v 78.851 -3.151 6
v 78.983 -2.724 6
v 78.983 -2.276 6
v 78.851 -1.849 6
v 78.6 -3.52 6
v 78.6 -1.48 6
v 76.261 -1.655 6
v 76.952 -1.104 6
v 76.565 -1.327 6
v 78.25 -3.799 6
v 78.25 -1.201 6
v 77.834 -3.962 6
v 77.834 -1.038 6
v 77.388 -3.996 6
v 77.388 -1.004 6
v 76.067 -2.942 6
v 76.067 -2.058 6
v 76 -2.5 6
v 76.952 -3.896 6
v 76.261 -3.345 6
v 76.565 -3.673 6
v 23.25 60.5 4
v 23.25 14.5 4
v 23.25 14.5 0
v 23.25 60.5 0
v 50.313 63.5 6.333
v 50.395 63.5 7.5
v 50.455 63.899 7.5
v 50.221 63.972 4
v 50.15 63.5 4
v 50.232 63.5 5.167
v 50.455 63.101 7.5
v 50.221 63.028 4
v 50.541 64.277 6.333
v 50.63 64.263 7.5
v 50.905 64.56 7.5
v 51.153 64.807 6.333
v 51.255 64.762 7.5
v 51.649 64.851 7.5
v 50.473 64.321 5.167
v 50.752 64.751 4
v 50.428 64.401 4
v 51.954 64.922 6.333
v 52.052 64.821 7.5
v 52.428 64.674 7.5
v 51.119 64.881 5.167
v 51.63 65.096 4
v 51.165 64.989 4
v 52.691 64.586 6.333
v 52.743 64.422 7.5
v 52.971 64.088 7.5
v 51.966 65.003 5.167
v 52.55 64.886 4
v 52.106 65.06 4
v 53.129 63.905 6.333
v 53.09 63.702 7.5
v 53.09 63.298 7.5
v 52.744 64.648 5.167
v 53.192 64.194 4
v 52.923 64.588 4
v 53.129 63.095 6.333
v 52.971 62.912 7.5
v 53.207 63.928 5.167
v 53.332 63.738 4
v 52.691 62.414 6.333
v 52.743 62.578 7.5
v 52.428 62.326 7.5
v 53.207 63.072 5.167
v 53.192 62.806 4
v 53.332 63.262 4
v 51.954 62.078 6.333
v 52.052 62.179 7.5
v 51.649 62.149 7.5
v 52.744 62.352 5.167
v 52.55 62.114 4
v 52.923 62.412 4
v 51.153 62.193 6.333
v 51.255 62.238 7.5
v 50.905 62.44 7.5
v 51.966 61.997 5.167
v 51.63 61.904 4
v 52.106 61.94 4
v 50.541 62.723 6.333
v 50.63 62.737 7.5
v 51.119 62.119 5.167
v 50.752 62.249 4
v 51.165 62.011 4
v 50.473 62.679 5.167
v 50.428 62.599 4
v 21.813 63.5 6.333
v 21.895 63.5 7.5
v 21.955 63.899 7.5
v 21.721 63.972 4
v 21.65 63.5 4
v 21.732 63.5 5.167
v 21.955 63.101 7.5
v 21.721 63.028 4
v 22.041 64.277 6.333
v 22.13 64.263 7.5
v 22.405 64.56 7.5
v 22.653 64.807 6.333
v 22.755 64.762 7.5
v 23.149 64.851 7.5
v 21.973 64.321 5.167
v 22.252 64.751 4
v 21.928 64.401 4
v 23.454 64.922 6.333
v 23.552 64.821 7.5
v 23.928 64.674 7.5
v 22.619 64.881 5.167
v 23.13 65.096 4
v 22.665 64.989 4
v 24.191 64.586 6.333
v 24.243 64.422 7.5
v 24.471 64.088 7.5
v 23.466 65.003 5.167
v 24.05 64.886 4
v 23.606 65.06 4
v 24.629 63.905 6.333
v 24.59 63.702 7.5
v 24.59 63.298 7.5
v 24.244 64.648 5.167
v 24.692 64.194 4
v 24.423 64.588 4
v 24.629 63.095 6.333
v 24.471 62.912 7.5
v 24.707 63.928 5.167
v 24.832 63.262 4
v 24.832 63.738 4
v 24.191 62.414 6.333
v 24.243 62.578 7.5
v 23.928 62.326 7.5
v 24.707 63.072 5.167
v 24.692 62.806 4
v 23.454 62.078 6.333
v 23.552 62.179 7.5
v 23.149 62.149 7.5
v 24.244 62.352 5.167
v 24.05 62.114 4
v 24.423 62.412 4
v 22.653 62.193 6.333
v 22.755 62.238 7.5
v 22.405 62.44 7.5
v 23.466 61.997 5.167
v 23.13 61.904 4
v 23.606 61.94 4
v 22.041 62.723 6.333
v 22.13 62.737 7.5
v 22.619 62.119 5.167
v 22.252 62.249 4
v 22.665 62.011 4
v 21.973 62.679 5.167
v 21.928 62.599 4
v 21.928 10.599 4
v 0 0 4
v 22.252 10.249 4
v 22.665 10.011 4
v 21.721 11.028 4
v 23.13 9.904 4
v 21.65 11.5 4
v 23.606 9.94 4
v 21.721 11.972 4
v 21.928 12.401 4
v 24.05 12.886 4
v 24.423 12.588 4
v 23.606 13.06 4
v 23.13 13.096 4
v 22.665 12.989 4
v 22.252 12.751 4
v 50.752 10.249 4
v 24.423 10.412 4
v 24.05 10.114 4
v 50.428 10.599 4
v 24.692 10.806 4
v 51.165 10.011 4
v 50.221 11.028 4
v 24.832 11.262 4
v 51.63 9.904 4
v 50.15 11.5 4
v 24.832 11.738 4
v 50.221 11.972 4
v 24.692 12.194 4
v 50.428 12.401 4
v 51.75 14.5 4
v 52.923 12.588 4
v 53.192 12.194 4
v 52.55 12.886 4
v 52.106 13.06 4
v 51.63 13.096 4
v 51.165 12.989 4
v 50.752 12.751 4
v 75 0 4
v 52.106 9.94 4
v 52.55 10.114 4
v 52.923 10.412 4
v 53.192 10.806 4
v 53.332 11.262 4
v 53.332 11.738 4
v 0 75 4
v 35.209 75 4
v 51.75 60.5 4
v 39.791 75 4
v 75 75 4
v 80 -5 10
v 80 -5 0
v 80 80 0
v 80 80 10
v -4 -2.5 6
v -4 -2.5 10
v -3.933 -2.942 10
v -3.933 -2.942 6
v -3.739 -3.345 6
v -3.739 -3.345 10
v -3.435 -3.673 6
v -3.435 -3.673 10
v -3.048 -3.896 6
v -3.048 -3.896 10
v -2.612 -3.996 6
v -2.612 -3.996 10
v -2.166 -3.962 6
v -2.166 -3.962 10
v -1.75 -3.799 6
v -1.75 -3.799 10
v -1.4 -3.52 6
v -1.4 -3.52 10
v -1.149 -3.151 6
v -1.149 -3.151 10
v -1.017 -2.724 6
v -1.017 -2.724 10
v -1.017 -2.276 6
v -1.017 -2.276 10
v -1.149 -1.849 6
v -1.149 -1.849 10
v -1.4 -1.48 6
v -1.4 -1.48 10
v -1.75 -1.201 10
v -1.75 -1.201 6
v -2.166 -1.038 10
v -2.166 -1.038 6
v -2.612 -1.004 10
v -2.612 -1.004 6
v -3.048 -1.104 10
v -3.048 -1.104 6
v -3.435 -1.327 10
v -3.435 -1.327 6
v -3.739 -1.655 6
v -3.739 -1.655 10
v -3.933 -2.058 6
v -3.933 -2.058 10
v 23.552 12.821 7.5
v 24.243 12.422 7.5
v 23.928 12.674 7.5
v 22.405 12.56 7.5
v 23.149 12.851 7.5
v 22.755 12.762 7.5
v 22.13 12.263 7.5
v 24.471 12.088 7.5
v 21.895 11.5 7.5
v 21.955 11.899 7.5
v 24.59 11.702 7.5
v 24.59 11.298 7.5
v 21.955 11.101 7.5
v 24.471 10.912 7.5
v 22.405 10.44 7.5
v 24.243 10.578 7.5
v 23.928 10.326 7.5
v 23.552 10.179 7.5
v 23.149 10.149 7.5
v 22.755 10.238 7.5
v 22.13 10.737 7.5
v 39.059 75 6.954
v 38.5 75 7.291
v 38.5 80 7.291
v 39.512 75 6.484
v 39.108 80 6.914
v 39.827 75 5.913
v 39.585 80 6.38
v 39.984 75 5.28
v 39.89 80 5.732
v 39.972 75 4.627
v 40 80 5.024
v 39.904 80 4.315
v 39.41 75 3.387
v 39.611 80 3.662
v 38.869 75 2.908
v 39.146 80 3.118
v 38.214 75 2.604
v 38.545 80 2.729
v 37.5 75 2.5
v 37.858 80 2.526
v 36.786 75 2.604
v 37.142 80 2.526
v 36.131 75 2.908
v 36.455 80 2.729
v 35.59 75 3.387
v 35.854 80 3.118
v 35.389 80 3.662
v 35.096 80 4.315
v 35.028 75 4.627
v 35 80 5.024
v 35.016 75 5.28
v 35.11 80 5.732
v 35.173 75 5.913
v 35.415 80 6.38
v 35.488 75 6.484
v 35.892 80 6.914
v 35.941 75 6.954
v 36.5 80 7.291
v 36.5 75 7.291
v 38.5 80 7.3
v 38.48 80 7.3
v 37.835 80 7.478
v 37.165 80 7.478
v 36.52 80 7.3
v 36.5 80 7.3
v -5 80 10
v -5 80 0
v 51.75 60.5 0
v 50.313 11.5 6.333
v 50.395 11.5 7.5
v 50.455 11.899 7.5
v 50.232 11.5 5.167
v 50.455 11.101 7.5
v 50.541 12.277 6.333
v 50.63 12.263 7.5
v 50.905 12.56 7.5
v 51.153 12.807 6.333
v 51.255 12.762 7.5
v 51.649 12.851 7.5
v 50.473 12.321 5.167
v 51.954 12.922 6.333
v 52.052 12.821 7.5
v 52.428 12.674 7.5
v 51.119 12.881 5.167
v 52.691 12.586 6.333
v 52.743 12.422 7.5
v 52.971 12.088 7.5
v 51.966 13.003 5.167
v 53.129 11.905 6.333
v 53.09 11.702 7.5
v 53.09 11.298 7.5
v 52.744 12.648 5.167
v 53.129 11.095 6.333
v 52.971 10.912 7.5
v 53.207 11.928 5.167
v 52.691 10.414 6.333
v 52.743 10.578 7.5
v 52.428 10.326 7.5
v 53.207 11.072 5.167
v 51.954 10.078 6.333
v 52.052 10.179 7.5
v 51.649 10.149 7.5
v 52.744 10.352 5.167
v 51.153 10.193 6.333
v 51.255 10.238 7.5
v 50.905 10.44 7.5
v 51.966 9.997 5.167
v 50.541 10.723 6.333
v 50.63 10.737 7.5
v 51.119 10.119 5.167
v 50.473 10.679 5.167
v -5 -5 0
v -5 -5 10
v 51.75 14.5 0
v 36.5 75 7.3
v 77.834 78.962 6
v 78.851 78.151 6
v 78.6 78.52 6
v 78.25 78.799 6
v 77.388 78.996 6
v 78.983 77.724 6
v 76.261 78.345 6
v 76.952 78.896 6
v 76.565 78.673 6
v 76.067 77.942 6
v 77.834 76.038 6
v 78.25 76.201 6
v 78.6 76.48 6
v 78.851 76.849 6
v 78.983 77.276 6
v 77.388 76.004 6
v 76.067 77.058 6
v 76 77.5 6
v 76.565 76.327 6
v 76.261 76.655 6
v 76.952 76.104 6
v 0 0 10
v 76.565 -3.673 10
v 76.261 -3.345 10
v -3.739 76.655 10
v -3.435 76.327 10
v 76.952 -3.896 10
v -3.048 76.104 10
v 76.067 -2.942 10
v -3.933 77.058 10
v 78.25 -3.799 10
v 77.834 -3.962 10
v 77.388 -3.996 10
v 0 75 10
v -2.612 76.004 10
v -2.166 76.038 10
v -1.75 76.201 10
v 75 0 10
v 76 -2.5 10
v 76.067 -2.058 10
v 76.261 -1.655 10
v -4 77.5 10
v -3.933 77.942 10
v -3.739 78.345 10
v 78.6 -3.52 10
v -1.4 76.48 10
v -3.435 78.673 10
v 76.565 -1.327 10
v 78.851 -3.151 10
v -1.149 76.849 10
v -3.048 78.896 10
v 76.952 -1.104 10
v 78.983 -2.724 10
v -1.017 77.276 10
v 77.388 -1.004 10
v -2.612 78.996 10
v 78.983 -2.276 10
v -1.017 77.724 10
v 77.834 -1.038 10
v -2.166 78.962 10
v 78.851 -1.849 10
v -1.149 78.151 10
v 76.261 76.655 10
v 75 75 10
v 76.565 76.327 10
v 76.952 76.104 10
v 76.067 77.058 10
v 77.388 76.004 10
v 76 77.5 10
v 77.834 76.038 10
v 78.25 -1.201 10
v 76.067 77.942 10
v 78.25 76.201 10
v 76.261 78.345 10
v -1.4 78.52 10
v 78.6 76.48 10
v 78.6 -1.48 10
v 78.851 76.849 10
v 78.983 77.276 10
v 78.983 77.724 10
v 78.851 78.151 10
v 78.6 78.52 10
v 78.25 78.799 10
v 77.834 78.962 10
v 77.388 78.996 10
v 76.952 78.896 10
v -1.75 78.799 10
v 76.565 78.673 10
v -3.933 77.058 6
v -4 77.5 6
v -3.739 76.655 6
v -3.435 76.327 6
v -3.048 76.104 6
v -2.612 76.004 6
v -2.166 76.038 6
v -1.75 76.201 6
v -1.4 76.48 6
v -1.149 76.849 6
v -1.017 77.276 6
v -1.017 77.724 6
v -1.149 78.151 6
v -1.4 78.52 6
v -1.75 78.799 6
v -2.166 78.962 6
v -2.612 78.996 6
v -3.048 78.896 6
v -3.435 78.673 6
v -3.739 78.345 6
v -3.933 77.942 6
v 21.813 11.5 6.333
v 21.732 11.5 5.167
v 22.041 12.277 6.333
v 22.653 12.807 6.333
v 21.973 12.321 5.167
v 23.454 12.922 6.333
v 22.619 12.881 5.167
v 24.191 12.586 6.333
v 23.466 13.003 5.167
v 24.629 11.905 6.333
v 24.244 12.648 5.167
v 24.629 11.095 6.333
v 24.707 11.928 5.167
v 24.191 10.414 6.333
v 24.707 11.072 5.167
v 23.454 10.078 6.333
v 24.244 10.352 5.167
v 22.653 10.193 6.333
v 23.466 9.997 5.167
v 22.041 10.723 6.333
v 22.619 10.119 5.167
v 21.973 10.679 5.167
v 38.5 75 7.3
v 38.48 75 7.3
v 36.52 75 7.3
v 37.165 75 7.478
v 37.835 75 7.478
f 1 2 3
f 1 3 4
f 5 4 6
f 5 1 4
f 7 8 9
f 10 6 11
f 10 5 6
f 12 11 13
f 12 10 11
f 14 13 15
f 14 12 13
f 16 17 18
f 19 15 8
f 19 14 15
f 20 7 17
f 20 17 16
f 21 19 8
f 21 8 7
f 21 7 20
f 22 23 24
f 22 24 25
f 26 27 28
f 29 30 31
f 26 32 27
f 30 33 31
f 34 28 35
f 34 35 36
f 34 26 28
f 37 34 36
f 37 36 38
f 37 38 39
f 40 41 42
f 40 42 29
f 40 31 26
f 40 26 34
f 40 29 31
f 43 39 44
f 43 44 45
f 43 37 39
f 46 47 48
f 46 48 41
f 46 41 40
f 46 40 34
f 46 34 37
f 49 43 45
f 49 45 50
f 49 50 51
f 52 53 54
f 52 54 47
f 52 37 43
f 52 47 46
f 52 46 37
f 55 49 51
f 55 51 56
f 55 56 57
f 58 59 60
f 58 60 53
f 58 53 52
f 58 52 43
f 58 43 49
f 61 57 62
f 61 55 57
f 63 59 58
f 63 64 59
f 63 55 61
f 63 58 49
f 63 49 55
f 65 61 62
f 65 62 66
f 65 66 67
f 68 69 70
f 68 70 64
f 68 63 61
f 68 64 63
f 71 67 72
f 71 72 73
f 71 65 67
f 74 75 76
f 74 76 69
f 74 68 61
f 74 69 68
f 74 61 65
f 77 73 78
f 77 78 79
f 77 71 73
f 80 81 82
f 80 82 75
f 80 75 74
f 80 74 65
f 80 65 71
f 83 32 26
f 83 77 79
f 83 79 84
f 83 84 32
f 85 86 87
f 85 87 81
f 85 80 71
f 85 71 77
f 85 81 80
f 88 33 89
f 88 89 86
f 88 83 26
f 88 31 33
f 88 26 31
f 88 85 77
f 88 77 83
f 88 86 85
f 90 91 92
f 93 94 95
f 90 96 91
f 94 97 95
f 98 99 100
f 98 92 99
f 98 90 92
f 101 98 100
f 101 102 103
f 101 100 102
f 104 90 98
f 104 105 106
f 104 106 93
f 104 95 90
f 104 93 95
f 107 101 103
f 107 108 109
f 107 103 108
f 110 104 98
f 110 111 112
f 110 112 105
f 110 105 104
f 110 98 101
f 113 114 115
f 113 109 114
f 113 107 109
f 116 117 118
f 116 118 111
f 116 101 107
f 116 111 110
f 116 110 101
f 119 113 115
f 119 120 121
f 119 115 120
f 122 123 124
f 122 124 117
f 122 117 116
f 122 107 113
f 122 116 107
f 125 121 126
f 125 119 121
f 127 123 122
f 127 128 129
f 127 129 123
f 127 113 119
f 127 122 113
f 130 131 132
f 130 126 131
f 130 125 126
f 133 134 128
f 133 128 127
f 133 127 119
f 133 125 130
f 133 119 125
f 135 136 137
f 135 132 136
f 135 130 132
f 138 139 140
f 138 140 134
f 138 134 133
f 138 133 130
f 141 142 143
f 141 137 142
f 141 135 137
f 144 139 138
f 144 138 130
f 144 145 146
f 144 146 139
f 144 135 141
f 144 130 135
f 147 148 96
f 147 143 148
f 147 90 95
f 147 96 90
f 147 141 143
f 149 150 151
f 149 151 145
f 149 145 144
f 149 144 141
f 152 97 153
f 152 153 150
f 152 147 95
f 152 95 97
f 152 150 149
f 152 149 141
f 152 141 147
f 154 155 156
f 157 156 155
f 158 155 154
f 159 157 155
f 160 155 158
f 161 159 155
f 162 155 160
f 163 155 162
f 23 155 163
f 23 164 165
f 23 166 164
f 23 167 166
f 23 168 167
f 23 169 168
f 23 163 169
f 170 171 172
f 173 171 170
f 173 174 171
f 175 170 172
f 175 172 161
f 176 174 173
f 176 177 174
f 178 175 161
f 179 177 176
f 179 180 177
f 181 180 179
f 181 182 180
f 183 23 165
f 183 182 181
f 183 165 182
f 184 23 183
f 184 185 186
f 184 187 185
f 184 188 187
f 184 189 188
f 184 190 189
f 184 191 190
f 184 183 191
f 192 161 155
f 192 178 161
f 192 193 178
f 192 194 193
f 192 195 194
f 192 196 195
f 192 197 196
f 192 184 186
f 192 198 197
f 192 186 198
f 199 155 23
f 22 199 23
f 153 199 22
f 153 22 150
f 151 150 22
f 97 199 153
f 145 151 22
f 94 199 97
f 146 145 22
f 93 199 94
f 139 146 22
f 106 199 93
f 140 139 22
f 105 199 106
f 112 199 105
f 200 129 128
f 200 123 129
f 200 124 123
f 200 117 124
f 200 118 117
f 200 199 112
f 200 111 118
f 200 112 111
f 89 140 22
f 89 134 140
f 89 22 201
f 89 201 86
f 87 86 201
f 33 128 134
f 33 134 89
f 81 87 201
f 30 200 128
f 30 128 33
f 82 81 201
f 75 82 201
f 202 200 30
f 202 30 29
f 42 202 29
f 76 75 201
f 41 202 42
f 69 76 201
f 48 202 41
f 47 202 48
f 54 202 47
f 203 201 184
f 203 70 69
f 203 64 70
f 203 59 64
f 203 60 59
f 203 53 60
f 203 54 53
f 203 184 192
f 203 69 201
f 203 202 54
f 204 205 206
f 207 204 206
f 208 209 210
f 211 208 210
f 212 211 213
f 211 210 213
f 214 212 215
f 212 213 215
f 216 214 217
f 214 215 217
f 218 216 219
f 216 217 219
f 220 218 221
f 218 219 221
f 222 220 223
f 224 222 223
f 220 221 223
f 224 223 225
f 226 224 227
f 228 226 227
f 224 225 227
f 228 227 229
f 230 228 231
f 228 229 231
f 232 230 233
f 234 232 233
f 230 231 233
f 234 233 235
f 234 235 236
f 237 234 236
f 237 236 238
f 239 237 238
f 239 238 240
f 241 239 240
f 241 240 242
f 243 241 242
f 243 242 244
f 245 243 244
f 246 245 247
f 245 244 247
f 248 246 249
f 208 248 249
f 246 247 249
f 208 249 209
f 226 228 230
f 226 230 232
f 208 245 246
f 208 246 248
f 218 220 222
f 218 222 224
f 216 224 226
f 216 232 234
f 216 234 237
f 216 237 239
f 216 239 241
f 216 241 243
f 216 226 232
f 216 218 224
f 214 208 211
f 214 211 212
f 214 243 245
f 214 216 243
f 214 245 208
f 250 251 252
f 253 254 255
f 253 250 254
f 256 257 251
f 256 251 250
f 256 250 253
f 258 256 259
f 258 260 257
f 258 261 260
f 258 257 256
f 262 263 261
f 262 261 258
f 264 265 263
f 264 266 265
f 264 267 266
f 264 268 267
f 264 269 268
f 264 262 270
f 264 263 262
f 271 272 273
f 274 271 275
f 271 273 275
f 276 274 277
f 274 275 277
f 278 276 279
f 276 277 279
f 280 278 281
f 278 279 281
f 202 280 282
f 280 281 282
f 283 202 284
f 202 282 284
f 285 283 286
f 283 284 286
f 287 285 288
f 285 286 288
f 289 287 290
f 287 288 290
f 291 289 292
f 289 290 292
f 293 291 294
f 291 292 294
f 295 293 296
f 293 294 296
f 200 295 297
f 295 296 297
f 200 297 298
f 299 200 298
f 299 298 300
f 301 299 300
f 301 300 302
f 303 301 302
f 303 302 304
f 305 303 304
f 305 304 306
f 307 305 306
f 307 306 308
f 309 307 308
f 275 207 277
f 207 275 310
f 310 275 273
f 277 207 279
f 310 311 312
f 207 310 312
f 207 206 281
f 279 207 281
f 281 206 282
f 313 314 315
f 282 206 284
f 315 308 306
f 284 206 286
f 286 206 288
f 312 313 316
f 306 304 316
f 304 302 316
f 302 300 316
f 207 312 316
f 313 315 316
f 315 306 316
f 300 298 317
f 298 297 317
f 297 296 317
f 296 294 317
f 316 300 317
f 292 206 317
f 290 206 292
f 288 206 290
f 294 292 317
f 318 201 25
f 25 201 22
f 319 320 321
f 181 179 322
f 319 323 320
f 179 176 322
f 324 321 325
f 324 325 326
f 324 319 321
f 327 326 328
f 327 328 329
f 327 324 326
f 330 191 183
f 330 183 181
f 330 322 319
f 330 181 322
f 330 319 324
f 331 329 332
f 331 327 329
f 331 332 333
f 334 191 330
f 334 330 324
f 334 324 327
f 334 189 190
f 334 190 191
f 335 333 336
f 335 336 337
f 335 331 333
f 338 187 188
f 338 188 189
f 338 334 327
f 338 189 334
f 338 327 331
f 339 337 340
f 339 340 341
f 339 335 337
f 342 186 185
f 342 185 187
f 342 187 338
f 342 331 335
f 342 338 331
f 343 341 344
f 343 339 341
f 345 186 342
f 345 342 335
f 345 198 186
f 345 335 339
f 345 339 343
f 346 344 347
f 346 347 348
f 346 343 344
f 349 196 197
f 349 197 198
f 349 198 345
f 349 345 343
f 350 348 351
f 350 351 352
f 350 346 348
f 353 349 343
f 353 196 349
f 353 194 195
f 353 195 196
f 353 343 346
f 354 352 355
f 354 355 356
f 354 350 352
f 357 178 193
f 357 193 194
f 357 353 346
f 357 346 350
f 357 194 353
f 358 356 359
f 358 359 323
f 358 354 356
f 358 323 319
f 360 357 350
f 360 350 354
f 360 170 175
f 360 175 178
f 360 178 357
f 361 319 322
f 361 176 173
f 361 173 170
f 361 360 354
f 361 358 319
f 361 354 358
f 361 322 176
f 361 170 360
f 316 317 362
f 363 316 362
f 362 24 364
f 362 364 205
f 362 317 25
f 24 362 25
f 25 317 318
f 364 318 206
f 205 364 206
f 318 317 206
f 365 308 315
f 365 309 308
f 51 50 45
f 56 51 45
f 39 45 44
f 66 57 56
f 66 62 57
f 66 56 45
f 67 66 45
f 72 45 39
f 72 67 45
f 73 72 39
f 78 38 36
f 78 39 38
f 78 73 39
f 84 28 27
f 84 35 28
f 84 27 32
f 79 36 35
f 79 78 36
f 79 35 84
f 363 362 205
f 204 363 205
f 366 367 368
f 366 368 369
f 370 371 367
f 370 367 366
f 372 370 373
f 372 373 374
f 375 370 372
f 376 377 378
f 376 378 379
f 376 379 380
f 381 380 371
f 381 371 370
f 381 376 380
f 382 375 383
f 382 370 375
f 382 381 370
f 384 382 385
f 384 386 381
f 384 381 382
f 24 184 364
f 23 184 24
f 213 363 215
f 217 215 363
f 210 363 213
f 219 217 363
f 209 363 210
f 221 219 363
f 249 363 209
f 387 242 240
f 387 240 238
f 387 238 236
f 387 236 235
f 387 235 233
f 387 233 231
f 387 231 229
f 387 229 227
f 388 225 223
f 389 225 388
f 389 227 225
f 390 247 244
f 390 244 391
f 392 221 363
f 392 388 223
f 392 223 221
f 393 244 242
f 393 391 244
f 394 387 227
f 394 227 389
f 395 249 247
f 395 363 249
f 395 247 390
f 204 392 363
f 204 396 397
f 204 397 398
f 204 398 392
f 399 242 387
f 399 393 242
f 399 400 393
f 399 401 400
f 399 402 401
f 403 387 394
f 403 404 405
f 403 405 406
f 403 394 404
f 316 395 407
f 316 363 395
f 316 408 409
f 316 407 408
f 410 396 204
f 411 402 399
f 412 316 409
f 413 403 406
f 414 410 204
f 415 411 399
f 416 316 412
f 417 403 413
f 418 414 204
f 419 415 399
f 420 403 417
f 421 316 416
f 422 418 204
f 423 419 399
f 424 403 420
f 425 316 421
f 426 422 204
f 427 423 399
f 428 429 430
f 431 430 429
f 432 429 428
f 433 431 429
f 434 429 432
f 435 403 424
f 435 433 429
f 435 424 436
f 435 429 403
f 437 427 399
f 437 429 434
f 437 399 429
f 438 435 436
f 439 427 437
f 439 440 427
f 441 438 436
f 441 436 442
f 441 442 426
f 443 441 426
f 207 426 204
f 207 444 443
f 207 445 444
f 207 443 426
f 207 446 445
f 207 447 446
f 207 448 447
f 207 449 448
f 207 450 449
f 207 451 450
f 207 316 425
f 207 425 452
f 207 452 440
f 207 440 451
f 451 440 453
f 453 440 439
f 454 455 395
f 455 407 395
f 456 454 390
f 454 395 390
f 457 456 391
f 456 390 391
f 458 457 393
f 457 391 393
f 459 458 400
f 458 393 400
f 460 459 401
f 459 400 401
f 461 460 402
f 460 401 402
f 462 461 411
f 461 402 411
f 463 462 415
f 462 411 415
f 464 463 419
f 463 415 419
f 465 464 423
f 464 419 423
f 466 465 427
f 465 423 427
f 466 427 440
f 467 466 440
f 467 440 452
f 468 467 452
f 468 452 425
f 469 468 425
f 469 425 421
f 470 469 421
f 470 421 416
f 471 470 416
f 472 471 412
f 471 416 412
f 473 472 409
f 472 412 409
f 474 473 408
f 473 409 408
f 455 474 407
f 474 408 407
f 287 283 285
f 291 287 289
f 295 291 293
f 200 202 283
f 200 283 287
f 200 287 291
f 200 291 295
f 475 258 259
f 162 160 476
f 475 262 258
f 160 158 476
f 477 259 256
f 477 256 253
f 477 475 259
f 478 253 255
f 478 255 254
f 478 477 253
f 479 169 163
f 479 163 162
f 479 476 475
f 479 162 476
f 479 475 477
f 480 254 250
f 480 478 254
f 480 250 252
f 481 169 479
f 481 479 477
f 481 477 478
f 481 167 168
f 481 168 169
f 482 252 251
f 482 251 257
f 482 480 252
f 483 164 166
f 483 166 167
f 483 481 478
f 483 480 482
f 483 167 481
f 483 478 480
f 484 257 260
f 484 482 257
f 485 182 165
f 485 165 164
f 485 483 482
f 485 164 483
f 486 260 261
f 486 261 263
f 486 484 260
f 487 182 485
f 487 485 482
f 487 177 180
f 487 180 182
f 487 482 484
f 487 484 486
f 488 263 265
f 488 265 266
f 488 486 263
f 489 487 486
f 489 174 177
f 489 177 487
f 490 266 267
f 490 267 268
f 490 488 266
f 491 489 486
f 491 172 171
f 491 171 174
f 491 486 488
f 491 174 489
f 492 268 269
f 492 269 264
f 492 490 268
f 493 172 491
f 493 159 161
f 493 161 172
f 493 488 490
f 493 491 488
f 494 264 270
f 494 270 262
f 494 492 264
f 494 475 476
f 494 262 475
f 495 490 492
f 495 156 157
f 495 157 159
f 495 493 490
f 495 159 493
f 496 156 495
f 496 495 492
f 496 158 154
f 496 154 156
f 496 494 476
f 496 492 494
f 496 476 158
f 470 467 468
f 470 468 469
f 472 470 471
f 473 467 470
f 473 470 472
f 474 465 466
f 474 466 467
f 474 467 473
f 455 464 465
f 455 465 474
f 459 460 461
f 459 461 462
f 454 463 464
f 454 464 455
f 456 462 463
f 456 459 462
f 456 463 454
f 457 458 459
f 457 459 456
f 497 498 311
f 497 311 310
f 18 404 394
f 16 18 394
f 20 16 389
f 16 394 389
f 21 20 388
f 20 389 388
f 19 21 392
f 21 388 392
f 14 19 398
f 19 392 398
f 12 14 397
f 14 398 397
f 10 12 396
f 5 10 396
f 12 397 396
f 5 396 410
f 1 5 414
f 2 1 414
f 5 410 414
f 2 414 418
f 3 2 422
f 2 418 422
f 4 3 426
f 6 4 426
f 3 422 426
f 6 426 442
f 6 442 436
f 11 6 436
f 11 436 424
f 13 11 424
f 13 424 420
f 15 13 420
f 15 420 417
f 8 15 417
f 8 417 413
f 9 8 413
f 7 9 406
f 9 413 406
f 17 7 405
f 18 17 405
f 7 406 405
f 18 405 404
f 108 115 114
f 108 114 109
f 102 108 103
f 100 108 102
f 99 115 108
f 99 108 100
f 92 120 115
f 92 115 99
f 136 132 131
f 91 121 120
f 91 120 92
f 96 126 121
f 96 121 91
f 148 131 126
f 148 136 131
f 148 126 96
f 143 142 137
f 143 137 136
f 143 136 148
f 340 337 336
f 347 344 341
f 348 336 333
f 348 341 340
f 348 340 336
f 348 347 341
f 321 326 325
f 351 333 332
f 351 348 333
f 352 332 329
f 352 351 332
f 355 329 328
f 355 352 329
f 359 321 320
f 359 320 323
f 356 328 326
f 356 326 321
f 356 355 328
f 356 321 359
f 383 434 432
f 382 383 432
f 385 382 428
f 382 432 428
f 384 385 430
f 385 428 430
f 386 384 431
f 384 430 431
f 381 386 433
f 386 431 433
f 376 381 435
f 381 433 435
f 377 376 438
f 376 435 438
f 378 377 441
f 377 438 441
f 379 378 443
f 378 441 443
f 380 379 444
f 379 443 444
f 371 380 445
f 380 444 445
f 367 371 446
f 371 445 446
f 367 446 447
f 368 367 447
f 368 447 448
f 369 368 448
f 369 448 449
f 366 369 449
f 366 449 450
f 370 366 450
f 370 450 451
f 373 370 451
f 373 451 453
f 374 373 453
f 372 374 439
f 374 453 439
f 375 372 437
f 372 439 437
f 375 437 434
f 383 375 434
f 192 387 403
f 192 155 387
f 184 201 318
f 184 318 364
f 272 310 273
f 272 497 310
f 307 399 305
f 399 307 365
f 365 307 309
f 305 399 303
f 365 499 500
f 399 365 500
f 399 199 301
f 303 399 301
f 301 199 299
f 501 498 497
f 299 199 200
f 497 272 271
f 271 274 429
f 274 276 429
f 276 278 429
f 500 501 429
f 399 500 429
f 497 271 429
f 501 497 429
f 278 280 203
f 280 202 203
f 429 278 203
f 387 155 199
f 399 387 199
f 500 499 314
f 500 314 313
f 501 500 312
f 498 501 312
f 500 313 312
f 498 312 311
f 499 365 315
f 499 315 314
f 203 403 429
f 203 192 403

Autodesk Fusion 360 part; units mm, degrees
sketch "Sketch1" plane through (0, 0, 0) normal (0, 0, 1) x (1, 0, 0)
  line L0 (0, 0) -> (0, 75)
  line L1 (0, 75) -> (75, 75)
  line L2 (0, 0) -> (75, 0)
  line L3 (75, 0) -> (75, 75)
  line L4 (75, 75) -> (0, 75)
  line L5 (0, 75) -> (0, 0)
  line L6 (-5, -5) -> (80, -5)
  line L7 (80, -5) -> (80, 80)
  line L8 (80, 80) -> (-5, 80)
  line L9 (-5, 80) -> (-5, -5)
  line L10 (-5, -5) -> (80, -5)
  line L11 (80, -5) -> (80, 80)
  dimension "d1" = 75
  dimension "d2" = 75
  dimension "d3" = 85
extrude "Extrude1" add sketch "Sketch1" along normal blind 10
sketch "Sketch2" plane through (0, 0, 0) normal (0, 0, 1) x (1, 0, 0)
  line L0 (0, 0) -> (75, 0)
  line L1 (75, 0) -> (75, 75)
  line L2 (75, 75) -> (0, 75)
  line L3 (0, 75) -> (0, 0)
extrude "Extrude2" add sketch "Sketch2" along normal blind 4
sketch "Sketch3" plane through (0, 0, 4) normal (0, 0, 1) x (-1, 0, 0)
  line L0 (0, -75) -> (0, 0)
  line L1 (0, 0) -> (-75, 0)
  line L2 (-75, 0) -> (-75, -75)
  line L3 (-75, -75) -> (0, -75)
  line L4 (0, -75) -> (-75, 0)
  line L5 (0, 0) -> (-75, -75)
  line L6 (-37.5, -37.5) -> (-20.25, -37.5)
  line L7 (-37.5, -37.5) -> (-54.75, -37.5)
  line L8 (-20.25, -37.5) -> (-20.25, -66.5)
  line L9 (-54.75, -37.5) -> (-54.75, -8.5)
  line L10 (-20.25, -66.5) -> (-54.75, -66.5)
  line L11 (-54.75, -66.5) -> (-54.75, -8.5)
  line L12 (-54.75, -8.5) -> (-20.25, -8.5)
  line L13 (-20.25, -8.5) -> (-20.25, -66.5)
  line L14 (-37.5, -37.5) -> (-37.5, -60.5)
  line L15 (-37.5, -37.5) -> (-37.5, -14.5)
  line L16 (-37.5, -14.5) -> (-51.75, -14.5)
  line L17 (-37.5, -60.5) -> (-23.25, -60.5)
  line L18 (-23.25, -60.5) -> (-51.75, -60.5)
  line L19 (-51.75, -60.5) -> (-51.75, -14.5)
  line L20 (-51.75, -14.5) -> (-23.25, -14.5)
  line L21 (-23.25, -14.5) -> (-23.25, -60.5)
  dimension "d8" = 17.25
  dimension "d9" = 17.25
  dimension "d10" = 29
  dimension "d11" = 29
  dimension "d12" = 23
  dimension "d13" = 23
  dimension "d14" = 14.25
  dimension "d15" = 14.25
extrude "Extrude3" cut sketch "Sketch3" against normal blind 5 contours L4 L14 L17 L18 L21 | L4 L6 L21 | L5 L6 L21 | L5 L15 L20 L21 | L5 L7 L19 | L5 L14 L18 L19 | L4 L7 L19 | L4 L15 L16 L19 L20
sketch "Sketch4" plane through (0, 0, 4) normal (0, 0, 1) x (-1, 0, 0)
  line L0 (-51.75, -60.5) -> (-51.75, -14.5)
  line L1 (-51.75, -14.5) -> (-23.25, -14.5)
  line L2 (-23.25, -14.5) -> (-23.25, -60.5)
  line L3 (-23.25, -60.5) -> (-51.75, -60.5)
  line L4 (0, -75) -> (0, 0)
  line L5 (0, 0) -> (-75, 0)
  line L6 (-75, 0) -> (-75, -75)
  line L7 (-75, -75) -> (0, -75)
  line L8 (-75, 0) -> (0, -75)
  line L9 (-75, -75) -> (0, 0)
  line L10 (-37.5, -37.5) -> (-54.75, -37.5)
  line L11 (-54.75, -37.5) -> (-54.75, -8.5)
  line L12 (-54.75, -8.5) -> (-20.25, -8.5)
  line L13 (-20.25, -8.5) -> (-20.25, -66.5)
  line L14 (-20.25, -66.5) -> (-54.75, -66.5)
  line L15 (-54.75, -66.5) -> (-54.75, -8.5)
  line L16 (-54.75, -8.5) -> (-20.25, -8.5)
  line L17 (-20.25, -8.5) -> (-20.25, -66.5)
  line L18 (-20.25, -66.5) -> (-20.25, -63.5)
  line L19 (-20.25, -63.5) -> (-23.25, -63.5)
  circle A0 centre (-23.25, -63.5) radius 1.6
  line L20 (-54.75, -66.5) -> (-51.75, -66.5)
  line L21 (-51.75, -66.5) -> (-51.75, -63.5)
  circle A1 centre (-51.75, -63.5) radius 1.6
  line L22 (-20.25, -8.5) -> (-23.25, -8.5)
  line L23 (-23.25, -8.5) -> (-23.25, -11.5)
  circle A2 centre (-23.25, -11.5) radius 1.6
  line L24 (-54.75, -8.5) -> (-54.75, -11.5)
  line L25 (-54.75, -11.5) -> (-51.75, -11.5)
  circle A3 centre (-51.75, -11.5) radius 1.6
  dimension "d23" = 17.25
  dimension "d24" = 29
  dimension "d25" = 34.5
  dimension "d26" = 58
  dimension "d27" = 3
  dimension "d28" = 3
  dimension "d29" = 3.2
  dimension "d30" = 3
  dimension "d31" = 3
  dimension "d32" = 3.2
  dimension "d33" = 3
  dimension "d34" = 3
  dimension "d35" = 3.2
  dimension "d36" = 3
  dimension "d37" = 3
  dimension "d38" = 3.2
extrude "Extrude4" add sketch "Sketch4" along normal blind 3.5 draft -4 contours A1 | A0 | A2 | A3
sketch "Sketch5" plane through (0, 0, 10) normal (0, 0, 1) x (-1, 0, 0)
  line L0 (0, 0) -> (0, -75)
  line L1 (0, -75) -> (-75, -75)
  line L2 (-75, -75) -> (-75, 0)
  line L3 (-75, 0) -> (0, 0)
  line L4 (-80, 5) -> (-80, -80)
  line L5 (-80, -80) -> (5, -80)
  line L6 (5, -80) -> (5, 5)
  line L7 (5, 5) -> (-80, 5)
  line L8 (5, 5) -> (0, 0)
  line L9 (5, 0) -> (0, 5)
  circle A0 centre (2.5, 2.5) radius 1.5
  line L10 (-75, 0) -> (-80, 5)
  circle A1 centre (-77.5, 2.5) radius 1.5
  line L11 (-75, 5) -> (-80, 0)
  circle A2 centre (-77.5, -77.5) radius 1.5
  circle A3 centre (2.5, -77.5) radius 1.5
  dimension "d41" = 3
  dimension "d43" = 3
  dimension "d44" = 3
  dimension "d45" = 3
extrude "Extrude5" cut sketch "Sketch5" against normal blind 4 contours L8 L9 A0 | L8 L9 A0 | L10 A1 L11 | L10 A1 L11 | L8 L9 A0 | L8 L9 A0 | L10 A1 L11 | L10 A1 L11 | A2 | A3
sketch "Sketch6" plane through (0, 75, 0) normal (0, -1, 0) x (1, 0, 0)
  line L0 (0, 4) -> (75, 4)
  line L1 (75, 4) -> (75, 10)
  line L2 (75, 10) -> (0, 10)
  line L3 (0, 10) -> (0, 4)
  line L4 (75, 4) -> (0, 10)
  line L5 (0, 4) -> (75, 10)
  line L6 (38.5, 6.7) -> (36.5, 6.7)
  line L7 (36.5, 6.7) -> (36.5, 7.3)
  line L8 (36.5, 7.3) -> (38.5, 7.3)
  line L9 (38.5, 7.3) -> (38.5, 6.7)
  line L10 (38.5, 6.7) -> (36.5, 7.3) construction
  line L11 (36.5, 6.7) -> (38.5, 7.3) construction
  point P0 (37.5, 7)
extrude "Extrude6" cut sketch "Sketch6" against normal blind 5 contours L4 L5 L7 | L4 L5 L6 L7 L9 | L4 L5 L9 | L4 L5 L7 L8 L9
sketch "Sketch7" plane through (0, 80, 0) normal (0, 1, 0) x (-1, 0, 0)
  line L0 (-36.5, 7.3) -> (-36.5, 6.7)
  line L1 (-38.5, 6.7) -> (-38.5, 7.3)
  line L2 (-80, 0) -> (5, 0)
  line L3 (5, 0) -> (5, 10)
  line L4 (5, 10) -> (-80, 10)
  line L5 (-80, 10) -> (-80, 0)
  line L6 (5, 0) -> (-80, 10)
  line L7 (-80, 0) -> (5, 10)
  circle A0 centre (-37.5, 5) radius 2.5
  dimension "d50" = 5
extrude "Extrude7" cut sketch "Sketch7" against normal blind 5 contours L6 L7 A0 | L6 L7 A0 | L6 L7 A0 | L6 L7 A0
equation "d8 = ( 34.5 / 2 ) * 1 mm"
equation "d9 = ( 34.5 / 2 ) * 1 mm"
equation "d10 = ( 58 / 2 ) * 1 mm"
equation "d11 = ( 58 / 2 ) * 1 mm"
equation "d12 = ( 46 / 2 ) * 1 mm"
equation "d13 = ( 46 / 2 ) * 1 mm"
equation "d14 = ( 28.5 / 2 ) * 1 mm"
equation "d15 = ( 28.5 / 2 ) * 1 mm"
equation "d23 = ( 34.5 / 2 ) * 1 mm"
equation "d24 = ( 58 / 2 ) * 1 mm"
